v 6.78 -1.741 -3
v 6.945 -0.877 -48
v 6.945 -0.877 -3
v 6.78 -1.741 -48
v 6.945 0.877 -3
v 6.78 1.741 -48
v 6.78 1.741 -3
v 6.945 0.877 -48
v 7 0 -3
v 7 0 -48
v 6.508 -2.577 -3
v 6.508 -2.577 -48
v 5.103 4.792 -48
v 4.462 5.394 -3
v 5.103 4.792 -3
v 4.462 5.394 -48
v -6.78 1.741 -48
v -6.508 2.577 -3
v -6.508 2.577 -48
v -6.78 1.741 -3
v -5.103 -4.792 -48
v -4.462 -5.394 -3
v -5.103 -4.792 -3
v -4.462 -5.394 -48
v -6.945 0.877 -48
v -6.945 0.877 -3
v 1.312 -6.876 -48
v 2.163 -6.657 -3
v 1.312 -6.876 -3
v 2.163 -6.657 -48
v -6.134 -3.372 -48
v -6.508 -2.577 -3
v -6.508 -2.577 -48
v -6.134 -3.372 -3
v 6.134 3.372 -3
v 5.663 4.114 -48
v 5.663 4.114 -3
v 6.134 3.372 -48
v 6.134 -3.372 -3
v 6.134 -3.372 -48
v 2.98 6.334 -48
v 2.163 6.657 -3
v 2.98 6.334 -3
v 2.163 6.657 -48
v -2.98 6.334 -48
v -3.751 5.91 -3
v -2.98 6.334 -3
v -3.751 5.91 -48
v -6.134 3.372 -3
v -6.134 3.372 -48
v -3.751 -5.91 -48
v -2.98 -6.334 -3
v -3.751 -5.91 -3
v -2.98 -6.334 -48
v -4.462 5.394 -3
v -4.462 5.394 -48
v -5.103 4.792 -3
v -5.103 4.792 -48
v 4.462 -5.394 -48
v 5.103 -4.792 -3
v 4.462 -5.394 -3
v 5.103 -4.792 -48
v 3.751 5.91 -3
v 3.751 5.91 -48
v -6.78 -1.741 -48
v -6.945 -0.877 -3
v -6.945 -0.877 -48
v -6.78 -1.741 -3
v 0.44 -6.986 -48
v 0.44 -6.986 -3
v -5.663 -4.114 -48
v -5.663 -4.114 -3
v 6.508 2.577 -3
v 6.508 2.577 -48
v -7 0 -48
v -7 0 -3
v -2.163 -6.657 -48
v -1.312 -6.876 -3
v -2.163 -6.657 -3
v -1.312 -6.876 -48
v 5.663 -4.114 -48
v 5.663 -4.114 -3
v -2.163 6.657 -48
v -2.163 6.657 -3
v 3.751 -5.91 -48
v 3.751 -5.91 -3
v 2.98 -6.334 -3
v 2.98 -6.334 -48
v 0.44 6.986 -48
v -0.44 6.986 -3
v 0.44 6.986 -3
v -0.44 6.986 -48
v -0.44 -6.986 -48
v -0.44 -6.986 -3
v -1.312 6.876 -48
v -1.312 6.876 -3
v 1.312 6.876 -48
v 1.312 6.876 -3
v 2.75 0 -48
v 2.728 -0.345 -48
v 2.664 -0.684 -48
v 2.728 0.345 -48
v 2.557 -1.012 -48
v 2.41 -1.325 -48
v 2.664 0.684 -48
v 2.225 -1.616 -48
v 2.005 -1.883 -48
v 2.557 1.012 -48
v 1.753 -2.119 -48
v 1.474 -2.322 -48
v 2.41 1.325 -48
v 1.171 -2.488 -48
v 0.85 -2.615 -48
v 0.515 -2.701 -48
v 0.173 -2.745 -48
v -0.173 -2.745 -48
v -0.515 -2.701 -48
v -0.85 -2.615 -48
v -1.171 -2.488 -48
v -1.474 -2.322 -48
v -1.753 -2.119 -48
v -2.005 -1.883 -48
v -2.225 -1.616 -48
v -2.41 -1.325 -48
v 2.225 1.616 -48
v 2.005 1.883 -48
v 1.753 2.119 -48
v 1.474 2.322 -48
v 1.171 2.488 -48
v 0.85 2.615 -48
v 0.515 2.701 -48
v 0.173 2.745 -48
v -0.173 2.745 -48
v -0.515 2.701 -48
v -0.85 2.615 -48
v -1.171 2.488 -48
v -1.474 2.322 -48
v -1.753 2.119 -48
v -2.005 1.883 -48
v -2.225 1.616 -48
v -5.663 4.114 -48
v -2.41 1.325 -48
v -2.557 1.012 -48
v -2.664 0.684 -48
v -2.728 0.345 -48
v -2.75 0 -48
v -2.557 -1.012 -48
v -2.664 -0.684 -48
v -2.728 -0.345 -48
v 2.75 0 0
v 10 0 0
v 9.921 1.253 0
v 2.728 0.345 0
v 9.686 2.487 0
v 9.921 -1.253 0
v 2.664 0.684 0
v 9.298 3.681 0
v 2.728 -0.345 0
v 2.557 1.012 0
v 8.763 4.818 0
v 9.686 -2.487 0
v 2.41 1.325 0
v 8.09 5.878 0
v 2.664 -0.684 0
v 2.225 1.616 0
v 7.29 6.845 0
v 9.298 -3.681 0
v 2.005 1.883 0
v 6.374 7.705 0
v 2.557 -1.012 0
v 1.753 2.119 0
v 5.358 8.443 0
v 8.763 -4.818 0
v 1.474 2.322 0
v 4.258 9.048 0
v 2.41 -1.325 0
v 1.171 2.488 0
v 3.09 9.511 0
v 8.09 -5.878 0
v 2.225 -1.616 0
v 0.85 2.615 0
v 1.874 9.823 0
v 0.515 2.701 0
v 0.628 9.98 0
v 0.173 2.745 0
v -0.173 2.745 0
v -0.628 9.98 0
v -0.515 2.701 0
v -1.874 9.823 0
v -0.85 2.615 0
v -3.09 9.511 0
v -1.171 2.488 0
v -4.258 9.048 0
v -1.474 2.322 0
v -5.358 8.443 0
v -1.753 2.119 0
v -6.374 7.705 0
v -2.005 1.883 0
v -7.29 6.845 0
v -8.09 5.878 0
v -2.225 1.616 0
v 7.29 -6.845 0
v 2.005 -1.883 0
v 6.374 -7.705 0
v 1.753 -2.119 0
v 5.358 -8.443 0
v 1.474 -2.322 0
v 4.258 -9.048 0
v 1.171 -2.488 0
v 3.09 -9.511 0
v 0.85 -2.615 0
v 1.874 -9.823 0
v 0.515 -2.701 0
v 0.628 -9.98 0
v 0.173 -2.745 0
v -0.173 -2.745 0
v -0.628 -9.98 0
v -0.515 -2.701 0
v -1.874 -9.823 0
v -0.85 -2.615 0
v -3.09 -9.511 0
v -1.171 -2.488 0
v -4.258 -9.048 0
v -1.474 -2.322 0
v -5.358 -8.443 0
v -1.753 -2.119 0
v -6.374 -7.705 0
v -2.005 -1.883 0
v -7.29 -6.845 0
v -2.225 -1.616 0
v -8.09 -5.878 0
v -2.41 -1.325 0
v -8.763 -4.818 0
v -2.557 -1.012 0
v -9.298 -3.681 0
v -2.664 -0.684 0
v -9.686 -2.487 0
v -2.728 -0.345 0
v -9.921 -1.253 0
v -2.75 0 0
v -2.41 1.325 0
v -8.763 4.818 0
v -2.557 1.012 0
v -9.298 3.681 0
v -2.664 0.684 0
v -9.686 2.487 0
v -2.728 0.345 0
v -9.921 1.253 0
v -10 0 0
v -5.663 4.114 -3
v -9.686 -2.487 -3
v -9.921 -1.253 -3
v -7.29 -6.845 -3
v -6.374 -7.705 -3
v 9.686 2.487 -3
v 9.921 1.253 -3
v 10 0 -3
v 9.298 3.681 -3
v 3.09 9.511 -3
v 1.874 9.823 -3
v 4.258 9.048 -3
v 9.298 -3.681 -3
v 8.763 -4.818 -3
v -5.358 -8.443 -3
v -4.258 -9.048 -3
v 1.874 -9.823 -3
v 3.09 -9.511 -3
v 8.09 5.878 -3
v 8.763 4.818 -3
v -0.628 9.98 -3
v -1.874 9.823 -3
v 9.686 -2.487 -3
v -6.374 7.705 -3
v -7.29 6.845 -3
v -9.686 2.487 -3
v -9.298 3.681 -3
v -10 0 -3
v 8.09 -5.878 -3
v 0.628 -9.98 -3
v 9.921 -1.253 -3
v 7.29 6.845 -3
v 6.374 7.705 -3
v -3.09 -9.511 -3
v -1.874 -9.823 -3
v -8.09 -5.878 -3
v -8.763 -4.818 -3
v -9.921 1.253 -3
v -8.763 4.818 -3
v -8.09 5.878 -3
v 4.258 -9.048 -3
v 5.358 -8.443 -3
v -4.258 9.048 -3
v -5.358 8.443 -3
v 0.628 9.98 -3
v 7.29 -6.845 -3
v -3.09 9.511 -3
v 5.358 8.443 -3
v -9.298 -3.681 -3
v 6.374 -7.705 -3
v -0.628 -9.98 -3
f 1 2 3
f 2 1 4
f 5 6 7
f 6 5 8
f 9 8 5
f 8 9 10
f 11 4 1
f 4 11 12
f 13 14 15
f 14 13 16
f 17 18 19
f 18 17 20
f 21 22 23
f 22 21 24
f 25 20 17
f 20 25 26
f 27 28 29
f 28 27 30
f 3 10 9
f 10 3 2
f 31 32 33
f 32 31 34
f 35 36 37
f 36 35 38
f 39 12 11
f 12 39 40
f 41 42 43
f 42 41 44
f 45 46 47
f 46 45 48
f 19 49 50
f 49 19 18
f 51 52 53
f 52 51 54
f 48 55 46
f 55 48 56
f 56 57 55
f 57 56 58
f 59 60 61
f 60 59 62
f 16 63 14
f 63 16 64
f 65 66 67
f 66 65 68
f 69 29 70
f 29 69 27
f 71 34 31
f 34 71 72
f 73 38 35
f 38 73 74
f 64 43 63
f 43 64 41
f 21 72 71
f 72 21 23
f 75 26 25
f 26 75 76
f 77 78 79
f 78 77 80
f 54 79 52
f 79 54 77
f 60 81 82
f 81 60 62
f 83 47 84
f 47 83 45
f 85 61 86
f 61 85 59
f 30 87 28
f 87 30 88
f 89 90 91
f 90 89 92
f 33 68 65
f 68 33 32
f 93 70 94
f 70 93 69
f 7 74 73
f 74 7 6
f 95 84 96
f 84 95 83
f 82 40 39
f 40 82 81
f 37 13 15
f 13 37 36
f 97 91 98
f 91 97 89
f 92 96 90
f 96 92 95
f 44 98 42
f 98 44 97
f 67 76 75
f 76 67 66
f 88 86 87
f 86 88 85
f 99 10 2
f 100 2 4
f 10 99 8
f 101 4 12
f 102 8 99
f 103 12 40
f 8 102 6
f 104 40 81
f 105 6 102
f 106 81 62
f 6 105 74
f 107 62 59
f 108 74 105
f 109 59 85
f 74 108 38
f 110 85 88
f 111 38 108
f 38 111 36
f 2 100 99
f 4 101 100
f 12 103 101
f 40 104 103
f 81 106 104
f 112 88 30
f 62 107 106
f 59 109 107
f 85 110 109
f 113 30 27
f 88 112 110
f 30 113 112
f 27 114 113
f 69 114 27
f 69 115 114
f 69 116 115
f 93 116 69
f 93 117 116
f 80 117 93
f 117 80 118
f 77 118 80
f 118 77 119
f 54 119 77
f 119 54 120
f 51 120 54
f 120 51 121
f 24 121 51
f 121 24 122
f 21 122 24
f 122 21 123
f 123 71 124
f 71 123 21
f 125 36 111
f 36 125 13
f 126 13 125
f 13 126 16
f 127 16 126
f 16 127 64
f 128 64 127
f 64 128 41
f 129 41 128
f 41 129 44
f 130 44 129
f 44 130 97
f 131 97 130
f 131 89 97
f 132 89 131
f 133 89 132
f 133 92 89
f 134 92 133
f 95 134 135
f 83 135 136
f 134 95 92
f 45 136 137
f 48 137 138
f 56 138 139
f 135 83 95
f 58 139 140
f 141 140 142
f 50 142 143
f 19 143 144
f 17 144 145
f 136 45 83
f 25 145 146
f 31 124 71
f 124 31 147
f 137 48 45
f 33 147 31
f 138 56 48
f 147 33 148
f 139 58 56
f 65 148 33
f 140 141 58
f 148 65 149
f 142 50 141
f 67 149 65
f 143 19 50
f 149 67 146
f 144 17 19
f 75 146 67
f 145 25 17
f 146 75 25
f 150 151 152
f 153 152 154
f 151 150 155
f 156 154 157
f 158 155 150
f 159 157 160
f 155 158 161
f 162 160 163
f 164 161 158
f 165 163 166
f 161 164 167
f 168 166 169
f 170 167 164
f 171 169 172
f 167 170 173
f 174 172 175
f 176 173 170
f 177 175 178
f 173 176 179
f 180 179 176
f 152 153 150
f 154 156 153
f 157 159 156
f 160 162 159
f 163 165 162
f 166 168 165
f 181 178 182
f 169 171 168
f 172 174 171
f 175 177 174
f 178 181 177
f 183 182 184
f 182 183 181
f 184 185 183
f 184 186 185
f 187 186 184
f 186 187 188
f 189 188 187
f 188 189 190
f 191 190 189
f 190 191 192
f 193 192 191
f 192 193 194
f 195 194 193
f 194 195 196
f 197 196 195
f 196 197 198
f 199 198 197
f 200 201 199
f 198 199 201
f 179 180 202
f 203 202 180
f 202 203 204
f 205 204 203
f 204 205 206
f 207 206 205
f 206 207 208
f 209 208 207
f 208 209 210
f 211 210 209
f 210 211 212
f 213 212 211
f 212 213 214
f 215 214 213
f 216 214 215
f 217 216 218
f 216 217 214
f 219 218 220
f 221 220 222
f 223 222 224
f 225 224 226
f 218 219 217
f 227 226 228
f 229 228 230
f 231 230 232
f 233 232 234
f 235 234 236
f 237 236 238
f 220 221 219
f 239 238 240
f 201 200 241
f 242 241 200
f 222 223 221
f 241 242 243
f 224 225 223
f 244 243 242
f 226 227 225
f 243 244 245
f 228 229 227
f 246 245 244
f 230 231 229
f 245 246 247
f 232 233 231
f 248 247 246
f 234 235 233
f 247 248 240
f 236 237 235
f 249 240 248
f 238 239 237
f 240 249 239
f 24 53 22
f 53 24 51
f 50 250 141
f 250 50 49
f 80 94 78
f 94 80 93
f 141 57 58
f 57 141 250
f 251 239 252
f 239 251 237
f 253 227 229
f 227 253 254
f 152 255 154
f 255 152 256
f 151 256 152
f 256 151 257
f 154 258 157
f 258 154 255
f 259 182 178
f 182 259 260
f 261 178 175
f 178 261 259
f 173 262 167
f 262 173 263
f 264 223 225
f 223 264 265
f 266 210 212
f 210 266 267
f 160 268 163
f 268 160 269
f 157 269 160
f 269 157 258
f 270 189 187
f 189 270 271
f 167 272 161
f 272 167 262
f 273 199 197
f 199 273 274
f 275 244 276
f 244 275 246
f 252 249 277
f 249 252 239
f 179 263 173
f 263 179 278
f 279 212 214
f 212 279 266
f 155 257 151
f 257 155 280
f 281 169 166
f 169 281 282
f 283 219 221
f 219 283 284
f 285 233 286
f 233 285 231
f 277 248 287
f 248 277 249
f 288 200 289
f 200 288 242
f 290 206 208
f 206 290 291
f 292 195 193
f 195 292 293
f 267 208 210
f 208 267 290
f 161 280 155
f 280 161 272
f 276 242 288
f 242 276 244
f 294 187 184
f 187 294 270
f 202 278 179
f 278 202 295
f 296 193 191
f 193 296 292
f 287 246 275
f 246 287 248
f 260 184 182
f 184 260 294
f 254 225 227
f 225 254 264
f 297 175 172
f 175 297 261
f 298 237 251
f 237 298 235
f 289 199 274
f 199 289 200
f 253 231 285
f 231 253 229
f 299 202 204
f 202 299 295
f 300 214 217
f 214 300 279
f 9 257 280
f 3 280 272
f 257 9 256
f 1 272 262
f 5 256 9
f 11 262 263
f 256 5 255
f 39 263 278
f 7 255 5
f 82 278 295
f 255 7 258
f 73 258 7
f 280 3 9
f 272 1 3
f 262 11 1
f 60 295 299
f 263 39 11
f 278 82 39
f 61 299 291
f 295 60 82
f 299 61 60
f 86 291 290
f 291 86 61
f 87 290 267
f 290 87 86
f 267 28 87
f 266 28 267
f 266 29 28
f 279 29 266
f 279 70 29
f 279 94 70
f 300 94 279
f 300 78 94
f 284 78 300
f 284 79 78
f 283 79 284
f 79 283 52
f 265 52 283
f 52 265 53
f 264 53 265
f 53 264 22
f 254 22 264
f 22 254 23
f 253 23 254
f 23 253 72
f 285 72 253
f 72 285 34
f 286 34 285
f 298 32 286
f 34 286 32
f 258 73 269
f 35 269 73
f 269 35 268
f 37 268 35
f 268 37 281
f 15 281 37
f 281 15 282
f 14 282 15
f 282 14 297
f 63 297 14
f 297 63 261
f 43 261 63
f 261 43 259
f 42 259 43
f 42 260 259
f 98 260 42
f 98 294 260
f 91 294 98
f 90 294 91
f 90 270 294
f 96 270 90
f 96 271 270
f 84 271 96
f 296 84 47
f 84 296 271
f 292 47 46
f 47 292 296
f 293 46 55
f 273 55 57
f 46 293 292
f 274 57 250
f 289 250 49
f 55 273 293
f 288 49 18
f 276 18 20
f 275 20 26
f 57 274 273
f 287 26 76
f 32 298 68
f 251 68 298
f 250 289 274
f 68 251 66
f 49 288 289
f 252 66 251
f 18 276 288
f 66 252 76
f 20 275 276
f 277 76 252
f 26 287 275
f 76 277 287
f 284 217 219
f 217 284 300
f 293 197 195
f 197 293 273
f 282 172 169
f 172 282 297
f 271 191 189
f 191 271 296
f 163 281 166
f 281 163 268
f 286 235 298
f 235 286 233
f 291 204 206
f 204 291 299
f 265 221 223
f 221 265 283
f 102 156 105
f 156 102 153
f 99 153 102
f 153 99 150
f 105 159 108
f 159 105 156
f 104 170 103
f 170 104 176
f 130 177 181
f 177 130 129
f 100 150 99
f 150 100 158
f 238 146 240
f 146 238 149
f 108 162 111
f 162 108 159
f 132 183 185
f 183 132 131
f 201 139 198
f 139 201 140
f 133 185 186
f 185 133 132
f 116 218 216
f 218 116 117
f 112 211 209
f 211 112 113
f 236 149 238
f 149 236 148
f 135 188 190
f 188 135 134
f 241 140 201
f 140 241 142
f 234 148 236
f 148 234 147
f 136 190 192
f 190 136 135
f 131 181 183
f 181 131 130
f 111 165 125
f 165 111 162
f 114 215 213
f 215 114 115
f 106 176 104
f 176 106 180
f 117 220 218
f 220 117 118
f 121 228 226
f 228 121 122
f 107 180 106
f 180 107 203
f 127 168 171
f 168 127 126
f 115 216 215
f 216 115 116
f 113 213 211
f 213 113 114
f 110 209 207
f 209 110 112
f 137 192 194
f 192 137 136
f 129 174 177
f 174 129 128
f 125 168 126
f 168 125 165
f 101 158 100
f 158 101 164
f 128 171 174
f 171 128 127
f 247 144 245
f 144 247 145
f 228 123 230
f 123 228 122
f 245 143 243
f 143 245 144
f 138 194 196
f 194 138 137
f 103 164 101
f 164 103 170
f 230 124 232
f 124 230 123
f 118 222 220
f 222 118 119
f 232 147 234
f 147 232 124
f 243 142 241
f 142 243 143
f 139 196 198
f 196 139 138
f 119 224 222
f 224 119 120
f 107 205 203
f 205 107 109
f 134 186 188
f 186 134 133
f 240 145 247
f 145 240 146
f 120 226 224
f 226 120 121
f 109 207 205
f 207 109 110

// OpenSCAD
$fn = 50;


difference() {
	union() {
		translate(v = [0, 0, -48.0000000000]) {
			cylinder(h = 48, r = 7.0000000000);
		}
		translate(v = [0, 0, -3.0000000000]) {
			cylinder(h = 3, r = 10.0000000000);
		}
	}
	union() {
		#translate(v = [0, 0, -48]) {
			cylinder(h = 48, r = 2.7500000000);
		}
	}
}
